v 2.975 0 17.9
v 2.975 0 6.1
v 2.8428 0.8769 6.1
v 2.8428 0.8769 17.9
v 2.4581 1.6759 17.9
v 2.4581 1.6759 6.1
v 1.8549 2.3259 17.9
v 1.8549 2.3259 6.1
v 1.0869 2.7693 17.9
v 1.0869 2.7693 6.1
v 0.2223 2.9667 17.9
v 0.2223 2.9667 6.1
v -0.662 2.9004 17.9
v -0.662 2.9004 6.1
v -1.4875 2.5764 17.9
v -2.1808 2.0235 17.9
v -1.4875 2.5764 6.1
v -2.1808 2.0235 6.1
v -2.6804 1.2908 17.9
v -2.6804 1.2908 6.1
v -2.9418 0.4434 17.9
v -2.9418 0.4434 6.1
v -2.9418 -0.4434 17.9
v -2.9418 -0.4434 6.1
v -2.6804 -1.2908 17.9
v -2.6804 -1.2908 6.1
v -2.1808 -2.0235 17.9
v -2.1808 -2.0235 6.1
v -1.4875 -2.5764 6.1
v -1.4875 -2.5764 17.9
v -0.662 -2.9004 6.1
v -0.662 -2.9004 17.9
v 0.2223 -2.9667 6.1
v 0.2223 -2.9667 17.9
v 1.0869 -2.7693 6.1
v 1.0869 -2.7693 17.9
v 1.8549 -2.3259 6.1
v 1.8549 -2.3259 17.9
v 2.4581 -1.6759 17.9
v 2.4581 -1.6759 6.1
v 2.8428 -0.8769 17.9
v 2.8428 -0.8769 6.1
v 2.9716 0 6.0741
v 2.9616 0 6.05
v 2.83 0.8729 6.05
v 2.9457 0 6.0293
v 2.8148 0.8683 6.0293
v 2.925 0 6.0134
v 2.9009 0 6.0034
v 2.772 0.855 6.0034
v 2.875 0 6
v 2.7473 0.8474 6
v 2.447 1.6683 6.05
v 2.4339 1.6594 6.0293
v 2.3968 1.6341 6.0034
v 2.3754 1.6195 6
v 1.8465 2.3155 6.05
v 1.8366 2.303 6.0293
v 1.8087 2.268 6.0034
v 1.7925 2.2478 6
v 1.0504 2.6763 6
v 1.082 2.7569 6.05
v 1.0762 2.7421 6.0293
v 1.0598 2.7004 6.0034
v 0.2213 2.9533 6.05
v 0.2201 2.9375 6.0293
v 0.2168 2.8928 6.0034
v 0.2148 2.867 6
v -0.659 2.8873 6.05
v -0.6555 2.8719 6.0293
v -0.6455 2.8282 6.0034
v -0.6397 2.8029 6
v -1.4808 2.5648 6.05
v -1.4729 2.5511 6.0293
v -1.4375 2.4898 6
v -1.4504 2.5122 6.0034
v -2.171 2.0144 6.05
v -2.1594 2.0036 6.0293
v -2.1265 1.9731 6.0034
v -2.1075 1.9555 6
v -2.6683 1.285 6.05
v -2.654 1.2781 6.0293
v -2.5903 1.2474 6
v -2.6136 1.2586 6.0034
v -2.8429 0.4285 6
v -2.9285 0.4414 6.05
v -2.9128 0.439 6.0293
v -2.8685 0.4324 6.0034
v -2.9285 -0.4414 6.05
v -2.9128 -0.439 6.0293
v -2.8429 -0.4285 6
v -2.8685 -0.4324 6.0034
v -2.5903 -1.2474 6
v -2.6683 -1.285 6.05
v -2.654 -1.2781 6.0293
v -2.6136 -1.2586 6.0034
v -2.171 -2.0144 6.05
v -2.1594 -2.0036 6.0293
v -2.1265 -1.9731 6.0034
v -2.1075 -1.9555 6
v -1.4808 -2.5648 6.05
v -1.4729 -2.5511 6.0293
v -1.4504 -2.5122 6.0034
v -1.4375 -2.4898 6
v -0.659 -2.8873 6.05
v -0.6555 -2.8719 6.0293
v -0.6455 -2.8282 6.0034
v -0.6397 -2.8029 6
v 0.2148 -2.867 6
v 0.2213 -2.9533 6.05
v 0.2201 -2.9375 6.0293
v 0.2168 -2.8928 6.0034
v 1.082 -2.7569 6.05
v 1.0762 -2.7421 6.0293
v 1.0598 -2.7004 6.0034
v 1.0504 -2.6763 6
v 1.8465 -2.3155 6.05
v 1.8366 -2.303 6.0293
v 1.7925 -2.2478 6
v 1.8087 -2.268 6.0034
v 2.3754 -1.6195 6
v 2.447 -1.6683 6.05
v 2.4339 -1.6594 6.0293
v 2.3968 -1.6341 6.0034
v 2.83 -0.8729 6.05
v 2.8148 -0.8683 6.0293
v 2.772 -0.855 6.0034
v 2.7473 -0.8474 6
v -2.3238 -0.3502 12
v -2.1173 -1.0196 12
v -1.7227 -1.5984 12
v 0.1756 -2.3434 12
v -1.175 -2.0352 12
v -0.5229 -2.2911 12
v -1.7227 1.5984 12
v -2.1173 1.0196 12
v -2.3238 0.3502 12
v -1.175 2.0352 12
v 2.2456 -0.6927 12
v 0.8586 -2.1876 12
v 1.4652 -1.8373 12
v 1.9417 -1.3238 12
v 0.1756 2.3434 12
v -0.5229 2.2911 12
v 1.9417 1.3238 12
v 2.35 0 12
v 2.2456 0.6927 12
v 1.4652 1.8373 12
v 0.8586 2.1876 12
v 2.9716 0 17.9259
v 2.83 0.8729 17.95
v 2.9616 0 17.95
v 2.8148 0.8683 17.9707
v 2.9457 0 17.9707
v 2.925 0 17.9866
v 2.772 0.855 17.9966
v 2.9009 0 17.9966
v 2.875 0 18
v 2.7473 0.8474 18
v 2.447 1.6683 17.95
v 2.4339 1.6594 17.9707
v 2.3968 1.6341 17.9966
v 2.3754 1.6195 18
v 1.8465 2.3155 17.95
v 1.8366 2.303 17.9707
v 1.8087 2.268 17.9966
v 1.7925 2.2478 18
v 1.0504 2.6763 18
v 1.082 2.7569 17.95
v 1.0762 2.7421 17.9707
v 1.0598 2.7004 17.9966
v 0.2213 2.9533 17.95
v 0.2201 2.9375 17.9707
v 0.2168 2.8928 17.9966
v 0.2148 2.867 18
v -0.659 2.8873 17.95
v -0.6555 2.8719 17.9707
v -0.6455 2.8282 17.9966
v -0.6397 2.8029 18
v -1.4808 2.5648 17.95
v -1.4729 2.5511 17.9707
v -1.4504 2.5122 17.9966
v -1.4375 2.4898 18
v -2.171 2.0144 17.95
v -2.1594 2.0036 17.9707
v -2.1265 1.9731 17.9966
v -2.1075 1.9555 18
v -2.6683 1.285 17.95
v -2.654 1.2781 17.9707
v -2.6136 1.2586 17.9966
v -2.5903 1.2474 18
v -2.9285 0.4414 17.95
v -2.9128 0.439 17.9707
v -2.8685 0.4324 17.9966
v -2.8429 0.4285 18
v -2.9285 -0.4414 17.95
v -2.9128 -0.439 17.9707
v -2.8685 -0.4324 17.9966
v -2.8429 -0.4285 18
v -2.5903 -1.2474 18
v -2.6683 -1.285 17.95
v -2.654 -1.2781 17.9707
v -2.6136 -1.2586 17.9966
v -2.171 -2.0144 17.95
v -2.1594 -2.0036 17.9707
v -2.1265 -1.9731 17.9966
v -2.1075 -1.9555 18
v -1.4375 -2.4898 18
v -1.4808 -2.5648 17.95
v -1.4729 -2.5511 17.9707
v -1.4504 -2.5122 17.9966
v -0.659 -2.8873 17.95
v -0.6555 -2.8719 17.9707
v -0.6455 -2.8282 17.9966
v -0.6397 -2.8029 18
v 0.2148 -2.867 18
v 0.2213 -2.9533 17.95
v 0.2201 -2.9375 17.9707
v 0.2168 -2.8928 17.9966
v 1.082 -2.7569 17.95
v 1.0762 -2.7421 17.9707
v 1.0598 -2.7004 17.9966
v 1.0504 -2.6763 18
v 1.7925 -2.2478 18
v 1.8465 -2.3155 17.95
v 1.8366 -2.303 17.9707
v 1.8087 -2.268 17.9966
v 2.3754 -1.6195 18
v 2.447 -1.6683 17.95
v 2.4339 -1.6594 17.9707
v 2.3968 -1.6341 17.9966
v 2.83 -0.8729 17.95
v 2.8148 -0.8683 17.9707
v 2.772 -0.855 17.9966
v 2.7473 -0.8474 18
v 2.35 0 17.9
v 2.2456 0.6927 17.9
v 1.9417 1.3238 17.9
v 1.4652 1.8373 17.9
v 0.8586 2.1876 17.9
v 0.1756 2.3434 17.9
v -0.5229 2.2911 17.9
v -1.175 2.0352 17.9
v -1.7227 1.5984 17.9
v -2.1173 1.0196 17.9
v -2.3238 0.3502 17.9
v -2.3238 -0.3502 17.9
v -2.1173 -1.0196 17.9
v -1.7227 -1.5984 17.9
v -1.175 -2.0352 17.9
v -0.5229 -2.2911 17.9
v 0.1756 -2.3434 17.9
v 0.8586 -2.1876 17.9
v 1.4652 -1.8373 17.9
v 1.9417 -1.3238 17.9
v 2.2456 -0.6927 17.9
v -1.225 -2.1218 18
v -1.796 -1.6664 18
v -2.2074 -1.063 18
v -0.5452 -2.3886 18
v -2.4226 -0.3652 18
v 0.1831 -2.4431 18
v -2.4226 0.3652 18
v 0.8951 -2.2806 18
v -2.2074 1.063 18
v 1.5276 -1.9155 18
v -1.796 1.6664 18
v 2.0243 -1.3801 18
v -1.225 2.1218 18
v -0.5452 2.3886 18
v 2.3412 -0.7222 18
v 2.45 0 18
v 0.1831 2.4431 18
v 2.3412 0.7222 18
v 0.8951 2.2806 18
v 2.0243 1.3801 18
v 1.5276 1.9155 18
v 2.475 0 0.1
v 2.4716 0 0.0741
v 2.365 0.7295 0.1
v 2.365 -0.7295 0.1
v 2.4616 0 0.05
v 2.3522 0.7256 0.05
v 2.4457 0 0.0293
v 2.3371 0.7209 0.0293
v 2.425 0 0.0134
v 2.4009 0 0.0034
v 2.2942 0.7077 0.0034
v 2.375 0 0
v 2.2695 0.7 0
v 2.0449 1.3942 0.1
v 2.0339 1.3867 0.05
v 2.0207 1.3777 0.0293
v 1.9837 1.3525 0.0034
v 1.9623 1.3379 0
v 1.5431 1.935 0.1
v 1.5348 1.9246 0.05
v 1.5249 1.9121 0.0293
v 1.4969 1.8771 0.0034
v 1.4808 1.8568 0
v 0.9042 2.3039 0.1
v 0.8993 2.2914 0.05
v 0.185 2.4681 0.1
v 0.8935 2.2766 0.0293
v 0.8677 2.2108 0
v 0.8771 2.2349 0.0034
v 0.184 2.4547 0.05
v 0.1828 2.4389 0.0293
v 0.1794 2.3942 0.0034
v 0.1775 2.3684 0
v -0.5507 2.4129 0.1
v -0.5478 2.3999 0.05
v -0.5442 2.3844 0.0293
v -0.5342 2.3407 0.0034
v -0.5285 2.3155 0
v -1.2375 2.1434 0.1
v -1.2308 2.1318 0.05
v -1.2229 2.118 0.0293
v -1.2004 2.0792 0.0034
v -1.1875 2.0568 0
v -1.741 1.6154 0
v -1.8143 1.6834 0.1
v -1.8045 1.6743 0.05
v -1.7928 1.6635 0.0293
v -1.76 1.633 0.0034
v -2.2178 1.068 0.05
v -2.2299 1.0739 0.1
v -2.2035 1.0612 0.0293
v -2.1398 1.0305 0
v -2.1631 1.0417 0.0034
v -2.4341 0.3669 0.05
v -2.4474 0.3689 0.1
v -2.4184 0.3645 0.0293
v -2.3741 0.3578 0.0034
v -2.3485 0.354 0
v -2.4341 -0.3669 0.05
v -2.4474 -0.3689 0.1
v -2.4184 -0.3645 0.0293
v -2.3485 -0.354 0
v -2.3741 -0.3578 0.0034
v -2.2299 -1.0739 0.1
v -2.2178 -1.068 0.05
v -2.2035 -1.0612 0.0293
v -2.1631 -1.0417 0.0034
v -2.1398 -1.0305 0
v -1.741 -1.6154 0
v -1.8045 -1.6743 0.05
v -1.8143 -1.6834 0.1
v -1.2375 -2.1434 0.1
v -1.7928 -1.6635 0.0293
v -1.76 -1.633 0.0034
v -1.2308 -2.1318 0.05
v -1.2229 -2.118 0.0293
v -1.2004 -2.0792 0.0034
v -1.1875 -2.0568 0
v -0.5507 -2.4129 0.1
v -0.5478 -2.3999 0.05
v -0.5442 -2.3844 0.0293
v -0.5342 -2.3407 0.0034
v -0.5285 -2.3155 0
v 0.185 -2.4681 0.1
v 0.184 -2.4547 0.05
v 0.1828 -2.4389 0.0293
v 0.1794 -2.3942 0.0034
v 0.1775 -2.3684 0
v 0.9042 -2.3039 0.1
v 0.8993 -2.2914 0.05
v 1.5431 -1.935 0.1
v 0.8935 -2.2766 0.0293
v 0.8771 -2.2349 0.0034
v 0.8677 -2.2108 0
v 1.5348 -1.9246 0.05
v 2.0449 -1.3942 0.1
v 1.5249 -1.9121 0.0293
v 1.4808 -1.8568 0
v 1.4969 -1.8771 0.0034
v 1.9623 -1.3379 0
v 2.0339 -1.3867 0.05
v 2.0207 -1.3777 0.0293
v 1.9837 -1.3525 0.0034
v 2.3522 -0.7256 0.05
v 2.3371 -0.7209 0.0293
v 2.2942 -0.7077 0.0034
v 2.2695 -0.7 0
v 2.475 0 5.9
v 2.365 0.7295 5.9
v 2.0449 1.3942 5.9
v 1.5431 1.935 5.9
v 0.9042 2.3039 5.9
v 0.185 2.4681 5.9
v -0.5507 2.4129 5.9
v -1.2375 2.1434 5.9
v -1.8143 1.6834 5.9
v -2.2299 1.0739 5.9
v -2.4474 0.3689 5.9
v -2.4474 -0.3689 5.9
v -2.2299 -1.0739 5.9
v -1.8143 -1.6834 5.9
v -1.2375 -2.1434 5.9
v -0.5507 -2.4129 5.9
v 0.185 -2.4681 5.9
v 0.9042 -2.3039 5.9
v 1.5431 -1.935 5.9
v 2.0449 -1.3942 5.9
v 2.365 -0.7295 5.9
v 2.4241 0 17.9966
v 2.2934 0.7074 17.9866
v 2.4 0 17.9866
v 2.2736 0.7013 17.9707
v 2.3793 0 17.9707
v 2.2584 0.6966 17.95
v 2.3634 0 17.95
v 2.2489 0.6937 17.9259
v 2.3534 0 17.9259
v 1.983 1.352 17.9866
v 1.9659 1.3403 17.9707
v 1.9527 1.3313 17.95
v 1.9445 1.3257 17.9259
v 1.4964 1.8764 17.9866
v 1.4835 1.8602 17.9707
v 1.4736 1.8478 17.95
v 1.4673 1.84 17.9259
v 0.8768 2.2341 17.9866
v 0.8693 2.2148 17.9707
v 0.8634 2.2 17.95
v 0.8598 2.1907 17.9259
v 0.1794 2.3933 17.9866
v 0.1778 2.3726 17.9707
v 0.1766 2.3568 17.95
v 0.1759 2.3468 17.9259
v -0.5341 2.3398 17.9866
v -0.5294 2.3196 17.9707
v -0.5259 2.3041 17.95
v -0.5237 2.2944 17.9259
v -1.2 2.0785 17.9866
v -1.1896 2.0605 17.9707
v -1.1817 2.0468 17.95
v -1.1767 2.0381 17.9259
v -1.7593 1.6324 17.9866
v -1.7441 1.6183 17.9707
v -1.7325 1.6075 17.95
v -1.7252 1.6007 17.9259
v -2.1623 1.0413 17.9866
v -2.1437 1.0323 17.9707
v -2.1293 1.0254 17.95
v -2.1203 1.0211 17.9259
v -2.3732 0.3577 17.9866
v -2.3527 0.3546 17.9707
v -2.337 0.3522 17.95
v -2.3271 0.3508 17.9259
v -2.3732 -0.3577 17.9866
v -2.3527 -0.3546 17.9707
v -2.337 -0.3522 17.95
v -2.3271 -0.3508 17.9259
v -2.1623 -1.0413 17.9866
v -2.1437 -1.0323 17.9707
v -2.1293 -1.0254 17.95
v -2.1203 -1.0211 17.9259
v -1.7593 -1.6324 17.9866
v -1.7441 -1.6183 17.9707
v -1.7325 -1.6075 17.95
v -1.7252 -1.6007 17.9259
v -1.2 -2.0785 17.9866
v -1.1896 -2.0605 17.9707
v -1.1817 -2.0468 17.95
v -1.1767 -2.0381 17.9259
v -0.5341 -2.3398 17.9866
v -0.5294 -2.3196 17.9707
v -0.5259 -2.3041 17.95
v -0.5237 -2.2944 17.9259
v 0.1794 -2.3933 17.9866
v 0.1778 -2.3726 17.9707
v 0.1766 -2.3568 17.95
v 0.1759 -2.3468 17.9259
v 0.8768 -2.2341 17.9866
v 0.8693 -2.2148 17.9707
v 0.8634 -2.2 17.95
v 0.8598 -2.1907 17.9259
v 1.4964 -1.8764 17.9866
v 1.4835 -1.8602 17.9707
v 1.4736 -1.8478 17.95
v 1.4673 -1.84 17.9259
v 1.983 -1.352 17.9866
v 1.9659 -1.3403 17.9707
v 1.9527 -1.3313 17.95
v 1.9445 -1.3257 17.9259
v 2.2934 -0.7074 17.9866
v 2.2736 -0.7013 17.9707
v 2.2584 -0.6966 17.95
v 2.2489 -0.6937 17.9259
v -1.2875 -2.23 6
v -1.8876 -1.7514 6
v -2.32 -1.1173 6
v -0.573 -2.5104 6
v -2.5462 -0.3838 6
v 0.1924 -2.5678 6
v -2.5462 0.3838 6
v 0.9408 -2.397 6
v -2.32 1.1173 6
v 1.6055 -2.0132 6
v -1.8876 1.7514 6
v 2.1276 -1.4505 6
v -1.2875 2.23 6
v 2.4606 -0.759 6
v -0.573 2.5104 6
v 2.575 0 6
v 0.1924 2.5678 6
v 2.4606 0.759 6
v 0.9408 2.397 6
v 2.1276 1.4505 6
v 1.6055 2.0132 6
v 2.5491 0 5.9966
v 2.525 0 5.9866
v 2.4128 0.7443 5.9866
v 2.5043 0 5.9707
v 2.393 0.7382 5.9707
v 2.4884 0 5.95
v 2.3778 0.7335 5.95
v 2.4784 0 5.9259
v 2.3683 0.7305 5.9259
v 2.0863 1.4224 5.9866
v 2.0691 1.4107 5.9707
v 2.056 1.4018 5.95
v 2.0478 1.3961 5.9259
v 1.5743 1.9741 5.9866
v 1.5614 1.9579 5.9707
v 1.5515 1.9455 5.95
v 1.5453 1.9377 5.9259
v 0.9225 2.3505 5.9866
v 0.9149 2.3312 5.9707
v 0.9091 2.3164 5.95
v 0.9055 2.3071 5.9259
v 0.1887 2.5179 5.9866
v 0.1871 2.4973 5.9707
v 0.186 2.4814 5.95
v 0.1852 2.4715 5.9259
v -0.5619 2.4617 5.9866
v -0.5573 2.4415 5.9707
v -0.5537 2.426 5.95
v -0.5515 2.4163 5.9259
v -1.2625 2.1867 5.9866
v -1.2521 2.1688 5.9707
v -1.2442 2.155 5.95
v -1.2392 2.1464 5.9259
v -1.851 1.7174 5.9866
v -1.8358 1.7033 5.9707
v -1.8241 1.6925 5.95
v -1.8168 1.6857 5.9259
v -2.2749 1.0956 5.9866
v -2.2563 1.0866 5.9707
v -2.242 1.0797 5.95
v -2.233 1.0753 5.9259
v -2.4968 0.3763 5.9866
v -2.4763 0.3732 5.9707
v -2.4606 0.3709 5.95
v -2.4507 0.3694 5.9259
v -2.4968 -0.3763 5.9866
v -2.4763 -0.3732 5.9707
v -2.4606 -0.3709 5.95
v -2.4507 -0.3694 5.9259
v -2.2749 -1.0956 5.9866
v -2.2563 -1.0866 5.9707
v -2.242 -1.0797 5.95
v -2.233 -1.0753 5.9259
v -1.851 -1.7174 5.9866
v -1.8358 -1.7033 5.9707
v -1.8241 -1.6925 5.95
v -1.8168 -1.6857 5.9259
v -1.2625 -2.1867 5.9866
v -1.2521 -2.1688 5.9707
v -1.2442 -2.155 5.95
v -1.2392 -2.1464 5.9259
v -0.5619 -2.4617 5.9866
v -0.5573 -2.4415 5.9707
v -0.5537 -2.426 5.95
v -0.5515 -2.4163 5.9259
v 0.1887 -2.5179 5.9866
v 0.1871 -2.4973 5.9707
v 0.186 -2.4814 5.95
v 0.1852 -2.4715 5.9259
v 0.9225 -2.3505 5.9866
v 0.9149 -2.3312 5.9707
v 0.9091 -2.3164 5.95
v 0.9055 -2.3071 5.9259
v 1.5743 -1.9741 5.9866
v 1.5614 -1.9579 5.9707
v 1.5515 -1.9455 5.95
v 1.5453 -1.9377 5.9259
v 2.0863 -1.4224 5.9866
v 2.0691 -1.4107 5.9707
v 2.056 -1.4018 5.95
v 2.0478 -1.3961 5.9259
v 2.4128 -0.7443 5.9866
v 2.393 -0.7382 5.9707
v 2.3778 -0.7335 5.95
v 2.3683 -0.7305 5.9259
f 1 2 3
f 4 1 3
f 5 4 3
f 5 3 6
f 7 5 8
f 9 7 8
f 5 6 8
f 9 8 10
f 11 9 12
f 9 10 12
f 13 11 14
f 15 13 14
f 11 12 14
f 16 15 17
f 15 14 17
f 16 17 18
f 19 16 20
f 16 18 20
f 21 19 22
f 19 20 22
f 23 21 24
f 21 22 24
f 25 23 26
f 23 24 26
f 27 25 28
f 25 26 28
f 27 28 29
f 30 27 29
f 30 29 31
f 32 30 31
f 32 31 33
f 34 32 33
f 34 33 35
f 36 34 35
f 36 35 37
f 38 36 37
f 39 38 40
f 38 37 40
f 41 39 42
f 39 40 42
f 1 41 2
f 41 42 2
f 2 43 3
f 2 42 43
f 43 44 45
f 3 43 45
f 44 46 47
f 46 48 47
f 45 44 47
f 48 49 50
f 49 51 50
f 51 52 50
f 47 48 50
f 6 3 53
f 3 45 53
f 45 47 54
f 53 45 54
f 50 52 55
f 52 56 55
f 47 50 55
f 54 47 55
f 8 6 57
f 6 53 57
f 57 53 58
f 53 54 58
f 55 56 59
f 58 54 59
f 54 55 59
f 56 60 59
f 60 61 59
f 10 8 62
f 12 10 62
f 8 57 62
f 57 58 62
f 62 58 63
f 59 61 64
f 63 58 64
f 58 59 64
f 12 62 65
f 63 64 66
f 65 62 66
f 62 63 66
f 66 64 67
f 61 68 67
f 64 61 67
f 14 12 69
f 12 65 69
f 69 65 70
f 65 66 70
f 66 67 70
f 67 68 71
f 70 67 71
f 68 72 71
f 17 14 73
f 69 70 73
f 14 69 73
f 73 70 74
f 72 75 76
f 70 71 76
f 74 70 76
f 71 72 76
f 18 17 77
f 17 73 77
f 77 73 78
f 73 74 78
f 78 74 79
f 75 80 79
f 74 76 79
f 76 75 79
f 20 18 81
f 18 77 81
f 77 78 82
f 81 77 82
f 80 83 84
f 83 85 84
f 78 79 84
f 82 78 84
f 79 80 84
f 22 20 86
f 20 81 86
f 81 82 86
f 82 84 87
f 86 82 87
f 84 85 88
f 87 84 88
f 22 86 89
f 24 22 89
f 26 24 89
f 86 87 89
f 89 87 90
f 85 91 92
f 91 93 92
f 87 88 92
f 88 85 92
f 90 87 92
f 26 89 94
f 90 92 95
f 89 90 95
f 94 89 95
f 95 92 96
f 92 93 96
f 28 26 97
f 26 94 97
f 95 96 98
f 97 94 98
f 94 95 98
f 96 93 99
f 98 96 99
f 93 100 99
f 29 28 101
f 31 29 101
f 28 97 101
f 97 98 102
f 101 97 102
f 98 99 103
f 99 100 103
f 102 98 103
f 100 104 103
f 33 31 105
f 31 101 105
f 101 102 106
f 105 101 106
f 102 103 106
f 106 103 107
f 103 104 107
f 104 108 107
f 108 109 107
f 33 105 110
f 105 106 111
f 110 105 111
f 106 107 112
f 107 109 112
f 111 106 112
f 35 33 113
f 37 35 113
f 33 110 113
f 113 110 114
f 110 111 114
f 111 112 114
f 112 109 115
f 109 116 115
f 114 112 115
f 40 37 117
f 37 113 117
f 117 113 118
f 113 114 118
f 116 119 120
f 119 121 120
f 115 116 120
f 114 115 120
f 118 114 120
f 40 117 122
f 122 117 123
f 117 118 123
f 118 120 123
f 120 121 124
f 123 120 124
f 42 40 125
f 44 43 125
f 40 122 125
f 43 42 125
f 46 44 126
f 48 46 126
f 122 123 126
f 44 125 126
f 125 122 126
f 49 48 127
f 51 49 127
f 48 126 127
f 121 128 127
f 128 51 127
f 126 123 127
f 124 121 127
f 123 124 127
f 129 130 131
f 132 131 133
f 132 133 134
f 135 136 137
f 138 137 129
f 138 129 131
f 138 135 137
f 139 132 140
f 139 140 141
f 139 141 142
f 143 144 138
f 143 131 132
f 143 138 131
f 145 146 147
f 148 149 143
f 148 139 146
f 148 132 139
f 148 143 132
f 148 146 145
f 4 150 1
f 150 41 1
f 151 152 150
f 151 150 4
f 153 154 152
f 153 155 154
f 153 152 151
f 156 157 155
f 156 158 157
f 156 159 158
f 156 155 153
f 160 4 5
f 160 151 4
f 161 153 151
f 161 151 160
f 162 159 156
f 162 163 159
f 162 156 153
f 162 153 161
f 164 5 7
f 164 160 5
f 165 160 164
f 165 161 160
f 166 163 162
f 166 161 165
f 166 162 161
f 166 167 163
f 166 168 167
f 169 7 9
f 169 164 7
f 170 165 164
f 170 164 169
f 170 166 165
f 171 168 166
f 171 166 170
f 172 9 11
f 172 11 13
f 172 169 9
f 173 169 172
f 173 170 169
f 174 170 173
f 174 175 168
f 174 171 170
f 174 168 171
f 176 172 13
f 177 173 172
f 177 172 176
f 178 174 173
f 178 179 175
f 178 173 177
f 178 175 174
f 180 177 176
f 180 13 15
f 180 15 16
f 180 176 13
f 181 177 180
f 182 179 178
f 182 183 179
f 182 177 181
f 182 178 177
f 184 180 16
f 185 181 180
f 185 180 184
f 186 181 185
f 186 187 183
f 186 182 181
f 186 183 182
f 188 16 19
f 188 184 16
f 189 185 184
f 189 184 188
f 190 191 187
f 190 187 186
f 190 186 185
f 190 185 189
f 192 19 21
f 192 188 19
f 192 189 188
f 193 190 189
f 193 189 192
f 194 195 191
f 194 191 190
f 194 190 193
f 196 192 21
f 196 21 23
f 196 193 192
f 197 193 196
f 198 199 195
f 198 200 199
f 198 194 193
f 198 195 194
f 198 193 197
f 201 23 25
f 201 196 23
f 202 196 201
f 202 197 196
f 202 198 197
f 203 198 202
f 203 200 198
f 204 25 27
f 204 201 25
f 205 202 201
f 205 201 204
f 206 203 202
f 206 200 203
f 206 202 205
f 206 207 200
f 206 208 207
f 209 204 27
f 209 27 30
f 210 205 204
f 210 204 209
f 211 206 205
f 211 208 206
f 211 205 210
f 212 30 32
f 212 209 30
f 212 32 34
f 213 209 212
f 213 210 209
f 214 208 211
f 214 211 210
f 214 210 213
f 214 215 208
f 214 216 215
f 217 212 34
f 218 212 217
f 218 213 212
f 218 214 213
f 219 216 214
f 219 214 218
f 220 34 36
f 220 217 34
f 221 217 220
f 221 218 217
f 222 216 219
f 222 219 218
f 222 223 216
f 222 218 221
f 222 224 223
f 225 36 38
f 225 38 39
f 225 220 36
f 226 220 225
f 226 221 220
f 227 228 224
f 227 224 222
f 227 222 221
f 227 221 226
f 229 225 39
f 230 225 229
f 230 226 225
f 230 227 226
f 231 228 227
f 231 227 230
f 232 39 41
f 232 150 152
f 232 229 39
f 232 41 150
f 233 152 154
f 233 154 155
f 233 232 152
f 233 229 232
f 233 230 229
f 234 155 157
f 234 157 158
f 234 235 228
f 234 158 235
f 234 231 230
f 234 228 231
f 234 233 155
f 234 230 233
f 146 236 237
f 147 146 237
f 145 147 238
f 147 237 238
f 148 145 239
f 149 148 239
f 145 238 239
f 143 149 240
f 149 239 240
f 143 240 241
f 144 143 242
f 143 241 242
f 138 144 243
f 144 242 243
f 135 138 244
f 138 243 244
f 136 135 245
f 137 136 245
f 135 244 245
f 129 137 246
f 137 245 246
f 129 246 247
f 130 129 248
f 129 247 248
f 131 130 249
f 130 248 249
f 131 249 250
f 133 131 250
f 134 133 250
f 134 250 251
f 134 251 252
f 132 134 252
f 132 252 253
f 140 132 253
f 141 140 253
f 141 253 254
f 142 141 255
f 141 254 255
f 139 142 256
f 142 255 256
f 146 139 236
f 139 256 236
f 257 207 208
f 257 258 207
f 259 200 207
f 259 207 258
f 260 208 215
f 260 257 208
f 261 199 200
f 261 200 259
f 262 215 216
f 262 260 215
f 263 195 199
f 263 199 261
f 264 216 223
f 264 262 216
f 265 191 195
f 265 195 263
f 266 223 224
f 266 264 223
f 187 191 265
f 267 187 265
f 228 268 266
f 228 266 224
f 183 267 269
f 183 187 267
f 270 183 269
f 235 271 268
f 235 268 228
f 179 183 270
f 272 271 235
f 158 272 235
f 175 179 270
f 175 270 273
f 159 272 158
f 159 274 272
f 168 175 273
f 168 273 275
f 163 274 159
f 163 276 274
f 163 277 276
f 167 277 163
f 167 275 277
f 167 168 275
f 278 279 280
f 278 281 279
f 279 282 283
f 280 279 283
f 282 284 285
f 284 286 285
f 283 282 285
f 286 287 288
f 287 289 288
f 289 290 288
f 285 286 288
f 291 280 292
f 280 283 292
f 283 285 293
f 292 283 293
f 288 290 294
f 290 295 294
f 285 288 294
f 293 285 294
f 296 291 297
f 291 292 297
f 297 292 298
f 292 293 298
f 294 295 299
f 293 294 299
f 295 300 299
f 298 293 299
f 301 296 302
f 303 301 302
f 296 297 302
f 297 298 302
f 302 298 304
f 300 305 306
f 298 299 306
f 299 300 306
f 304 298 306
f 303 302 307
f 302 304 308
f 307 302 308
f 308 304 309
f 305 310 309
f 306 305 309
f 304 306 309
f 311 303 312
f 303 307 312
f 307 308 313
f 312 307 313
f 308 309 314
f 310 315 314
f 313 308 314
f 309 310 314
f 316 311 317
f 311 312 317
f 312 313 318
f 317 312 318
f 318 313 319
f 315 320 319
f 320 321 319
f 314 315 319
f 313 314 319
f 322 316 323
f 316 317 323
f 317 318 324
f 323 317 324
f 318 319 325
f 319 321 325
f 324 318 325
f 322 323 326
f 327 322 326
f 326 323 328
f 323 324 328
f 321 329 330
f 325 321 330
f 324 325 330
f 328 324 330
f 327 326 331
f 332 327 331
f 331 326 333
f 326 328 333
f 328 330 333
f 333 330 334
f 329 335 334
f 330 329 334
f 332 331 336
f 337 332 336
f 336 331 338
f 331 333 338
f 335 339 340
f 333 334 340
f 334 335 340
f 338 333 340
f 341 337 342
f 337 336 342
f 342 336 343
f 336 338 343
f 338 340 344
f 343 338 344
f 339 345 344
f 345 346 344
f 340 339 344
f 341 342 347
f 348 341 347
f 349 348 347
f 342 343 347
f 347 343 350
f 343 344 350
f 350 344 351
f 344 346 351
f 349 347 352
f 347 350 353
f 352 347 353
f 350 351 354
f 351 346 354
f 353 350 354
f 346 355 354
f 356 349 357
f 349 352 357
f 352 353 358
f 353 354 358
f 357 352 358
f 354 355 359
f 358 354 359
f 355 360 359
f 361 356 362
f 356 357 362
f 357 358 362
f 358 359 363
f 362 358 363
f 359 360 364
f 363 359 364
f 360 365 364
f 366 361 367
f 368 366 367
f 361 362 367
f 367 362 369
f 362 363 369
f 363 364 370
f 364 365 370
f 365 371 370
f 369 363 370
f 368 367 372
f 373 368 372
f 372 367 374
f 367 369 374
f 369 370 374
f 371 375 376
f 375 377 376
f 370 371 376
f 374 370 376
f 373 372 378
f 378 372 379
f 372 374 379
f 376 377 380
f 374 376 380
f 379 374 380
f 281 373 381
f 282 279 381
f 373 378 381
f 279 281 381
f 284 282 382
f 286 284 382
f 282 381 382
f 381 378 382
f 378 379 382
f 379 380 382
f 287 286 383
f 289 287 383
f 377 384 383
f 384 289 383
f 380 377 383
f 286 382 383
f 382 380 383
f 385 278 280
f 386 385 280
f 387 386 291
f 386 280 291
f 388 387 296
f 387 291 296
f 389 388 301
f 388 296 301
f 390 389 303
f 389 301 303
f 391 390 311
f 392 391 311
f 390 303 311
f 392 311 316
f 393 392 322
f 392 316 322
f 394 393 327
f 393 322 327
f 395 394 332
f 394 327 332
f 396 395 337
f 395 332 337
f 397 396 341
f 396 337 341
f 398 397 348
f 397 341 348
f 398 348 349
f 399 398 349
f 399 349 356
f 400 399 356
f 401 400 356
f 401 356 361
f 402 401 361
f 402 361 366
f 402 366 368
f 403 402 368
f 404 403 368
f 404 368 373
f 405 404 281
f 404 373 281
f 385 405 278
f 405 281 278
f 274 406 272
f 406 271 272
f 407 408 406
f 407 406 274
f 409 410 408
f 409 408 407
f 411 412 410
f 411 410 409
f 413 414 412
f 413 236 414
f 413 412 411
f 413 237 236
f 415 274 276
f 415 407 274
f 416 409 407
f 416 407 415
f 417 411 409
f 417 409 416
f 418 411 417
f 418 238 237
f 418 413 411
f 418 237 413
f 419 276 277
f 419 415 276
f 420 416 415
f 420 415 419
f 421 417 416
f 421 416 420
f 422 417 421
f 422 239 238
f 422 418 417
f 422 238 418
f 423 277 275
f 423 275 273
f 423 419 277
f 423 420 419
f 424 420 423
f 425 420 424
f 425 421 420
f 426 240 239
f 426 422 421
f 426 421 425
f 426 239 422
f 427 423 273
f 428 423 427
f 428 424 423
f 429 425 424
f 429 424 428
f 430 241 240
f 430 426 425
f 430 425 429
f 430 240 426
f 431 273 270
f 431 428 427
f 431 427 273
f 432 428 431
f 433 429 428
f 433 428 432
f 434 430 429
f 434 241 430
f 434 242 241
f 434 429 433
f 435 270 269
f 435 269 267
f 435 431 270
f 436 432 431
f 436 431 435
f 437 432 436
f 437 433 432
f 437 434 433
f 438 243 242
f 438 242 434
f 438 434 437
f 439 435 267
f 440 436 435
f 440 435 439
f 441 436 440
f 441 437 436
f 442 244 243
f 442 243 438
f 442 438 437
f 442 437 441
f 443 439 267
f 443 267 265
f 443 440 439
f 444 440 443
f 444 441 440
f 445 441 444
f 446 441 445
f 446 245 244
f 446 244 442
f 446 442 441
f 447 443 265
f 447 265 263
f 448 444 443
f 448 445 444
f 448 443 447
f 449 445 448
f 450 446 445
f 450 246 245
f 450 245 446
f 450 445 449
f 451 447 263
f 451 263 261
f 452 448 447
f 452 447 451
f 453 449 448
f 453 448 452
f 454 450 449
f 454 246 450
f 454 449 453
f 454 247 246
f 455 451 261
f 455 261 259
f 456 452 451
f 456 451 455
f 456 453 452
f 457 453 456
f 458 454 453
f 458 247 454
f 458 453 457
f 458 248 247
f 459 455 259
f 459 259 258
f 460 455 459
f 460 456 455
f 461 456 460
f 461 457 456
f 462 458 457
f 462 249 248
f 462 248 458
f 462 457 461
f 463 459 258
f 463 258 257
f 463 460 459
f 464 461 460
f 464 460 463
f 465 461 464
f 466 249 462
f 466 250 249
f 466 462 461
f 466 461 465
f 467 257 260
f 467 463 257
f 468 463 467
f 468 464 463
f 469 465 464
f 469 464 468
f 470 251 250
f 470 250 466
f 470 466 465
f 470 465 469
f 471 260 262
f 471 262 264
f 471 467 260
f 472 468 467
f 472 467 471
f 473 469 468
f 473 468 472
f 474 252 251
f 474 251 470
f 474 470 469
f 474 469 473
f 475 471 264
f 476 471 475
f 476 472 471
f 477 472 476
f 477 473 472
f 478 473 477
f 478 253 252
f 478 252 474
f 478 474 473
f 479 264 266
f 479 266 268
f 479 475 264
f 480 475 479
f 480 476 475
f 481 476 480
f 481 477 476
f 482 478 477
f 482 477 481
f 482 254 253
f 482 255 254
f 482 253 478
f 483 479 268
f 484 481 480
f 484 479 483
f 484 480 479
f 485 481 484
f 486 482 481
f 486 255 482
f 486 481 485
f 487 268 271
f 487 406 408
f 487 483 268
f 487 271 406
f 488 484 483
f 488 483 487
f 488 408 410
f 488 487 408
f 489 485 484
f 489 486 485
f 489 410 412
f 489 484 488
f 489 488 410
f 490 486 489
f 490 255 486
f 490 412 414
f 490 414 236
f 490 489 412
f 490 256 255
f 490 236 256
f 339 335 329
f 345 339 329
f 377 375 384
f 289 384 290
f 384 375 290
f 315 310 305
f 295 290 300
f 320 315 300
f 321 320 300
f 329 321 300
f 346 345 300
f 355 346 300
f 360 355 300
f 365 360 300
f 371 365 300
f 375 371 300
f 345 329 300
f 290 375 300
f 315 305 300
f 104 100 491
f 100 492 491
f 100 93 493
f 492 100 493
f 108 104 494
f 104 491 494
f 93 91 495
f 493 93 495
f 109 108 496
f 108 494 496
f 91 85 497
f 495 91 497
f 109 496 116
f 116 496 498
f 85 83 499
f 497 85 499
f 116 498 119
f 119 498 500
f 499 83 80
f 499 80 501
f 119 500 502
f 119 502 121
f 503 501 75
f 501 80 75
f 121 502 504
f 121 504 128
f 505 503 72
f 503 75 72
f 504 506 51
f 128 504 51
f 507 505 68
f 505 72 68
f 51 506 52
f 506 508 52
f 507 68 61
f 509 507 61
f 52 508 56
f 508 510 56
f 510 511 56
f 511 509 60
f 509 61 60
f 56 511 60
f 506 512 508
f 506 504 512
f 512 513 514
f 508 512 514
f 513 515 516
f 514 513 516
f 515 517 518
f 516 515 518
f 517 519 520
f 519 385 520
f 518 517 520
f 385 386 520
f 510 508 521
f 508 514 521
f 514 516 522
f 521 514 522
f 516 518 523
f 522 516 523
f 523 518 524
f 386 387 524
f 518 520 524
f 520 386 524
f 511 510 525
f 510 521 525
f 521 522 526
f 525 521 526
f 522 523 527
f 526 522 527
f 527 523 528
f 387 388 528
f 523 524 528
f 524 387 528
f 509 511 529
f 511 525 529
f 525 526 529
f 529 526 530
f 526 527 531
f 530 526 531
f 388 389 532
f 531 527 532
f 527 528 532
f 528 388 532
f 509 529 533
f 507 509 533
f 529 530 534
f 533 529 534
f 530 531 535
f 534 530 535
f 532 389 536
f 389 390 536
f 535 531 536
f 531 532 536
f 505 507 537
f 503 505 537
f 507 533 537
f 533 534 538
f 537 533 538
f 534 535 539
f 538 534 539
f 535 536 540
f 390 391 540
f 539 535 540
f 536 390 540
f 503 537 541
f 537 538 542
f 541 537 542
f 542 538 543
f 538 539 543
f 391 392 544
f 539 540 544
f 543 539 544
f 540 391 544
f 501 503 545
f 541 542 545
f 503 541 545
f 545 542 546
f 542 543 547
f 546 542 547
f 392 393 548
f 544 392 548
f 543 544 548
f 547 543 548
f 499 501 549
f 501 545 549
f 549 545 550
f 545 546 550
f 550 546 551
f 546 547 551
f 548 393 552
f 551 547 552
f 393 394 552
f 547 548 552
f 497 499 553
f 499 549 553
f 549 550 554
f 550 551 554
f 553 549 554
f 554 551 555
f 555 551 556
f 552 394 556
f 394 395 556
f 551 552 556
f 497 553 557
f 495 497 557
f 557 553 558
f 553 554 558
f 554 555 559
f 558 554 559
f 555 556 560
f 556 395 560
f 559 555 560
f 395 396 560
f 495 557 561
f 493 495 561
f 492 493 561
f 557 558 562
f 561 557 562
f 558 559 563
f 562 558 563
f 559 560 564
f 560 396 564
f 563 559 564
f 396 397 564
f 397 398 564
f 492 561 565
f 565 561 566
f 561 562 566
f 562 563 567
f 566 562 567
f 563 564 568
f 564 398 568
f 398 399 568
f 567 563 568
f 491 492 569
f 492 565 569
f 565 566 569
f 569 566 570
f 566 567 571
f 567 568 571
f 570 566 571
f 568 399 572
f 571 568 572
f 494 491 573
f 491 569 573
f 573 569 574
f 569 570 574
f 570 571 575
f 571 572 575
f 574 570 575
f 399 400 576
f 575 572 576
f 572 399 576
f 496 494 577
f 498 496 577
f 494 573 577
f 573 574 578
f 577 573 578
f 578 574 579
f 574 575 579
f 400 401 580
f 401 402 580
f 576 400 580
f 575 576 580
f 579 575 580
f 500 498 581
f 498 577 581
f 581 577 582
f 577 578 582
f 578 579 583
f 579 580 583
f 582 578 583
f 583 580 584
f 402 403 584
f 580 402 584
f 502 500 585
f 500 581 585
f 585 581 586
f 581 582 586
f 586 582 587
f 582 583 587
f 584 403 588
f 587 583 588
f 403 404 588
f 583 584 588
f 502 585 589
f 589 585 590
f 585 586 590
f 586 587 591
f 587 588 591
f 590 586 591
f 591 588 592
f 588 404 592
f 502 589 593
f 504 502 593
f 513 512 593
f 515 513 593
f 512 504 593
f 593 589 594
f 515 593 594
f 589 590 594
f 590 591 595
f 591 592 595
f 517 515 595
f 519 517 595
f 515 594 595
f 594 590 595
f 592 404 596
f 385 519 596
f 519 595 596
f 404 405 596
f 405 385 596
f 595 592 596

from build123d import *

# Parameters (mm, degrees)
F0_R     = 2.475
F1_DEPTH = 6
F2_R     = 2.975
F3_DEPTH = 12
F4_R     = 2.35
F5_DEPTH = 6
F6_R     = 0.1


with BuildPart() as f1:
    # F0 (on Top) → F1 (new body)
    with BuildSketch(Plane.XY):
        Circle(F0_R)
    extrude(amount=F1_DEPTH)

    # F2 (on face) → F3 (join)
    with BuildSketch(Plane.XY.offset(6)):
        Circle(F2_R)
    extrude(amount=F3_DEPTH)

    # F4 (on face) → F5 (cut)
    with BuildSketch(Plane.XY.offset(18)):
        Circle(F4_R)
    extrude(amount=-F5_DEPTH, mode=Mode.SUBTRACT)

    # F6
    f6_edges = [f1.edges().sort_by_distance(p)[0] for p in [
        (-2.475, 0, 0),
        (-2.975, 0, 18),
        (-2.35, 0, 18),
        (-2.975, 0, 6),
        (-2.475, 0, 6),
    ]]
    fillet(f6_edges, radius=F6_R)


solid = f1.part
